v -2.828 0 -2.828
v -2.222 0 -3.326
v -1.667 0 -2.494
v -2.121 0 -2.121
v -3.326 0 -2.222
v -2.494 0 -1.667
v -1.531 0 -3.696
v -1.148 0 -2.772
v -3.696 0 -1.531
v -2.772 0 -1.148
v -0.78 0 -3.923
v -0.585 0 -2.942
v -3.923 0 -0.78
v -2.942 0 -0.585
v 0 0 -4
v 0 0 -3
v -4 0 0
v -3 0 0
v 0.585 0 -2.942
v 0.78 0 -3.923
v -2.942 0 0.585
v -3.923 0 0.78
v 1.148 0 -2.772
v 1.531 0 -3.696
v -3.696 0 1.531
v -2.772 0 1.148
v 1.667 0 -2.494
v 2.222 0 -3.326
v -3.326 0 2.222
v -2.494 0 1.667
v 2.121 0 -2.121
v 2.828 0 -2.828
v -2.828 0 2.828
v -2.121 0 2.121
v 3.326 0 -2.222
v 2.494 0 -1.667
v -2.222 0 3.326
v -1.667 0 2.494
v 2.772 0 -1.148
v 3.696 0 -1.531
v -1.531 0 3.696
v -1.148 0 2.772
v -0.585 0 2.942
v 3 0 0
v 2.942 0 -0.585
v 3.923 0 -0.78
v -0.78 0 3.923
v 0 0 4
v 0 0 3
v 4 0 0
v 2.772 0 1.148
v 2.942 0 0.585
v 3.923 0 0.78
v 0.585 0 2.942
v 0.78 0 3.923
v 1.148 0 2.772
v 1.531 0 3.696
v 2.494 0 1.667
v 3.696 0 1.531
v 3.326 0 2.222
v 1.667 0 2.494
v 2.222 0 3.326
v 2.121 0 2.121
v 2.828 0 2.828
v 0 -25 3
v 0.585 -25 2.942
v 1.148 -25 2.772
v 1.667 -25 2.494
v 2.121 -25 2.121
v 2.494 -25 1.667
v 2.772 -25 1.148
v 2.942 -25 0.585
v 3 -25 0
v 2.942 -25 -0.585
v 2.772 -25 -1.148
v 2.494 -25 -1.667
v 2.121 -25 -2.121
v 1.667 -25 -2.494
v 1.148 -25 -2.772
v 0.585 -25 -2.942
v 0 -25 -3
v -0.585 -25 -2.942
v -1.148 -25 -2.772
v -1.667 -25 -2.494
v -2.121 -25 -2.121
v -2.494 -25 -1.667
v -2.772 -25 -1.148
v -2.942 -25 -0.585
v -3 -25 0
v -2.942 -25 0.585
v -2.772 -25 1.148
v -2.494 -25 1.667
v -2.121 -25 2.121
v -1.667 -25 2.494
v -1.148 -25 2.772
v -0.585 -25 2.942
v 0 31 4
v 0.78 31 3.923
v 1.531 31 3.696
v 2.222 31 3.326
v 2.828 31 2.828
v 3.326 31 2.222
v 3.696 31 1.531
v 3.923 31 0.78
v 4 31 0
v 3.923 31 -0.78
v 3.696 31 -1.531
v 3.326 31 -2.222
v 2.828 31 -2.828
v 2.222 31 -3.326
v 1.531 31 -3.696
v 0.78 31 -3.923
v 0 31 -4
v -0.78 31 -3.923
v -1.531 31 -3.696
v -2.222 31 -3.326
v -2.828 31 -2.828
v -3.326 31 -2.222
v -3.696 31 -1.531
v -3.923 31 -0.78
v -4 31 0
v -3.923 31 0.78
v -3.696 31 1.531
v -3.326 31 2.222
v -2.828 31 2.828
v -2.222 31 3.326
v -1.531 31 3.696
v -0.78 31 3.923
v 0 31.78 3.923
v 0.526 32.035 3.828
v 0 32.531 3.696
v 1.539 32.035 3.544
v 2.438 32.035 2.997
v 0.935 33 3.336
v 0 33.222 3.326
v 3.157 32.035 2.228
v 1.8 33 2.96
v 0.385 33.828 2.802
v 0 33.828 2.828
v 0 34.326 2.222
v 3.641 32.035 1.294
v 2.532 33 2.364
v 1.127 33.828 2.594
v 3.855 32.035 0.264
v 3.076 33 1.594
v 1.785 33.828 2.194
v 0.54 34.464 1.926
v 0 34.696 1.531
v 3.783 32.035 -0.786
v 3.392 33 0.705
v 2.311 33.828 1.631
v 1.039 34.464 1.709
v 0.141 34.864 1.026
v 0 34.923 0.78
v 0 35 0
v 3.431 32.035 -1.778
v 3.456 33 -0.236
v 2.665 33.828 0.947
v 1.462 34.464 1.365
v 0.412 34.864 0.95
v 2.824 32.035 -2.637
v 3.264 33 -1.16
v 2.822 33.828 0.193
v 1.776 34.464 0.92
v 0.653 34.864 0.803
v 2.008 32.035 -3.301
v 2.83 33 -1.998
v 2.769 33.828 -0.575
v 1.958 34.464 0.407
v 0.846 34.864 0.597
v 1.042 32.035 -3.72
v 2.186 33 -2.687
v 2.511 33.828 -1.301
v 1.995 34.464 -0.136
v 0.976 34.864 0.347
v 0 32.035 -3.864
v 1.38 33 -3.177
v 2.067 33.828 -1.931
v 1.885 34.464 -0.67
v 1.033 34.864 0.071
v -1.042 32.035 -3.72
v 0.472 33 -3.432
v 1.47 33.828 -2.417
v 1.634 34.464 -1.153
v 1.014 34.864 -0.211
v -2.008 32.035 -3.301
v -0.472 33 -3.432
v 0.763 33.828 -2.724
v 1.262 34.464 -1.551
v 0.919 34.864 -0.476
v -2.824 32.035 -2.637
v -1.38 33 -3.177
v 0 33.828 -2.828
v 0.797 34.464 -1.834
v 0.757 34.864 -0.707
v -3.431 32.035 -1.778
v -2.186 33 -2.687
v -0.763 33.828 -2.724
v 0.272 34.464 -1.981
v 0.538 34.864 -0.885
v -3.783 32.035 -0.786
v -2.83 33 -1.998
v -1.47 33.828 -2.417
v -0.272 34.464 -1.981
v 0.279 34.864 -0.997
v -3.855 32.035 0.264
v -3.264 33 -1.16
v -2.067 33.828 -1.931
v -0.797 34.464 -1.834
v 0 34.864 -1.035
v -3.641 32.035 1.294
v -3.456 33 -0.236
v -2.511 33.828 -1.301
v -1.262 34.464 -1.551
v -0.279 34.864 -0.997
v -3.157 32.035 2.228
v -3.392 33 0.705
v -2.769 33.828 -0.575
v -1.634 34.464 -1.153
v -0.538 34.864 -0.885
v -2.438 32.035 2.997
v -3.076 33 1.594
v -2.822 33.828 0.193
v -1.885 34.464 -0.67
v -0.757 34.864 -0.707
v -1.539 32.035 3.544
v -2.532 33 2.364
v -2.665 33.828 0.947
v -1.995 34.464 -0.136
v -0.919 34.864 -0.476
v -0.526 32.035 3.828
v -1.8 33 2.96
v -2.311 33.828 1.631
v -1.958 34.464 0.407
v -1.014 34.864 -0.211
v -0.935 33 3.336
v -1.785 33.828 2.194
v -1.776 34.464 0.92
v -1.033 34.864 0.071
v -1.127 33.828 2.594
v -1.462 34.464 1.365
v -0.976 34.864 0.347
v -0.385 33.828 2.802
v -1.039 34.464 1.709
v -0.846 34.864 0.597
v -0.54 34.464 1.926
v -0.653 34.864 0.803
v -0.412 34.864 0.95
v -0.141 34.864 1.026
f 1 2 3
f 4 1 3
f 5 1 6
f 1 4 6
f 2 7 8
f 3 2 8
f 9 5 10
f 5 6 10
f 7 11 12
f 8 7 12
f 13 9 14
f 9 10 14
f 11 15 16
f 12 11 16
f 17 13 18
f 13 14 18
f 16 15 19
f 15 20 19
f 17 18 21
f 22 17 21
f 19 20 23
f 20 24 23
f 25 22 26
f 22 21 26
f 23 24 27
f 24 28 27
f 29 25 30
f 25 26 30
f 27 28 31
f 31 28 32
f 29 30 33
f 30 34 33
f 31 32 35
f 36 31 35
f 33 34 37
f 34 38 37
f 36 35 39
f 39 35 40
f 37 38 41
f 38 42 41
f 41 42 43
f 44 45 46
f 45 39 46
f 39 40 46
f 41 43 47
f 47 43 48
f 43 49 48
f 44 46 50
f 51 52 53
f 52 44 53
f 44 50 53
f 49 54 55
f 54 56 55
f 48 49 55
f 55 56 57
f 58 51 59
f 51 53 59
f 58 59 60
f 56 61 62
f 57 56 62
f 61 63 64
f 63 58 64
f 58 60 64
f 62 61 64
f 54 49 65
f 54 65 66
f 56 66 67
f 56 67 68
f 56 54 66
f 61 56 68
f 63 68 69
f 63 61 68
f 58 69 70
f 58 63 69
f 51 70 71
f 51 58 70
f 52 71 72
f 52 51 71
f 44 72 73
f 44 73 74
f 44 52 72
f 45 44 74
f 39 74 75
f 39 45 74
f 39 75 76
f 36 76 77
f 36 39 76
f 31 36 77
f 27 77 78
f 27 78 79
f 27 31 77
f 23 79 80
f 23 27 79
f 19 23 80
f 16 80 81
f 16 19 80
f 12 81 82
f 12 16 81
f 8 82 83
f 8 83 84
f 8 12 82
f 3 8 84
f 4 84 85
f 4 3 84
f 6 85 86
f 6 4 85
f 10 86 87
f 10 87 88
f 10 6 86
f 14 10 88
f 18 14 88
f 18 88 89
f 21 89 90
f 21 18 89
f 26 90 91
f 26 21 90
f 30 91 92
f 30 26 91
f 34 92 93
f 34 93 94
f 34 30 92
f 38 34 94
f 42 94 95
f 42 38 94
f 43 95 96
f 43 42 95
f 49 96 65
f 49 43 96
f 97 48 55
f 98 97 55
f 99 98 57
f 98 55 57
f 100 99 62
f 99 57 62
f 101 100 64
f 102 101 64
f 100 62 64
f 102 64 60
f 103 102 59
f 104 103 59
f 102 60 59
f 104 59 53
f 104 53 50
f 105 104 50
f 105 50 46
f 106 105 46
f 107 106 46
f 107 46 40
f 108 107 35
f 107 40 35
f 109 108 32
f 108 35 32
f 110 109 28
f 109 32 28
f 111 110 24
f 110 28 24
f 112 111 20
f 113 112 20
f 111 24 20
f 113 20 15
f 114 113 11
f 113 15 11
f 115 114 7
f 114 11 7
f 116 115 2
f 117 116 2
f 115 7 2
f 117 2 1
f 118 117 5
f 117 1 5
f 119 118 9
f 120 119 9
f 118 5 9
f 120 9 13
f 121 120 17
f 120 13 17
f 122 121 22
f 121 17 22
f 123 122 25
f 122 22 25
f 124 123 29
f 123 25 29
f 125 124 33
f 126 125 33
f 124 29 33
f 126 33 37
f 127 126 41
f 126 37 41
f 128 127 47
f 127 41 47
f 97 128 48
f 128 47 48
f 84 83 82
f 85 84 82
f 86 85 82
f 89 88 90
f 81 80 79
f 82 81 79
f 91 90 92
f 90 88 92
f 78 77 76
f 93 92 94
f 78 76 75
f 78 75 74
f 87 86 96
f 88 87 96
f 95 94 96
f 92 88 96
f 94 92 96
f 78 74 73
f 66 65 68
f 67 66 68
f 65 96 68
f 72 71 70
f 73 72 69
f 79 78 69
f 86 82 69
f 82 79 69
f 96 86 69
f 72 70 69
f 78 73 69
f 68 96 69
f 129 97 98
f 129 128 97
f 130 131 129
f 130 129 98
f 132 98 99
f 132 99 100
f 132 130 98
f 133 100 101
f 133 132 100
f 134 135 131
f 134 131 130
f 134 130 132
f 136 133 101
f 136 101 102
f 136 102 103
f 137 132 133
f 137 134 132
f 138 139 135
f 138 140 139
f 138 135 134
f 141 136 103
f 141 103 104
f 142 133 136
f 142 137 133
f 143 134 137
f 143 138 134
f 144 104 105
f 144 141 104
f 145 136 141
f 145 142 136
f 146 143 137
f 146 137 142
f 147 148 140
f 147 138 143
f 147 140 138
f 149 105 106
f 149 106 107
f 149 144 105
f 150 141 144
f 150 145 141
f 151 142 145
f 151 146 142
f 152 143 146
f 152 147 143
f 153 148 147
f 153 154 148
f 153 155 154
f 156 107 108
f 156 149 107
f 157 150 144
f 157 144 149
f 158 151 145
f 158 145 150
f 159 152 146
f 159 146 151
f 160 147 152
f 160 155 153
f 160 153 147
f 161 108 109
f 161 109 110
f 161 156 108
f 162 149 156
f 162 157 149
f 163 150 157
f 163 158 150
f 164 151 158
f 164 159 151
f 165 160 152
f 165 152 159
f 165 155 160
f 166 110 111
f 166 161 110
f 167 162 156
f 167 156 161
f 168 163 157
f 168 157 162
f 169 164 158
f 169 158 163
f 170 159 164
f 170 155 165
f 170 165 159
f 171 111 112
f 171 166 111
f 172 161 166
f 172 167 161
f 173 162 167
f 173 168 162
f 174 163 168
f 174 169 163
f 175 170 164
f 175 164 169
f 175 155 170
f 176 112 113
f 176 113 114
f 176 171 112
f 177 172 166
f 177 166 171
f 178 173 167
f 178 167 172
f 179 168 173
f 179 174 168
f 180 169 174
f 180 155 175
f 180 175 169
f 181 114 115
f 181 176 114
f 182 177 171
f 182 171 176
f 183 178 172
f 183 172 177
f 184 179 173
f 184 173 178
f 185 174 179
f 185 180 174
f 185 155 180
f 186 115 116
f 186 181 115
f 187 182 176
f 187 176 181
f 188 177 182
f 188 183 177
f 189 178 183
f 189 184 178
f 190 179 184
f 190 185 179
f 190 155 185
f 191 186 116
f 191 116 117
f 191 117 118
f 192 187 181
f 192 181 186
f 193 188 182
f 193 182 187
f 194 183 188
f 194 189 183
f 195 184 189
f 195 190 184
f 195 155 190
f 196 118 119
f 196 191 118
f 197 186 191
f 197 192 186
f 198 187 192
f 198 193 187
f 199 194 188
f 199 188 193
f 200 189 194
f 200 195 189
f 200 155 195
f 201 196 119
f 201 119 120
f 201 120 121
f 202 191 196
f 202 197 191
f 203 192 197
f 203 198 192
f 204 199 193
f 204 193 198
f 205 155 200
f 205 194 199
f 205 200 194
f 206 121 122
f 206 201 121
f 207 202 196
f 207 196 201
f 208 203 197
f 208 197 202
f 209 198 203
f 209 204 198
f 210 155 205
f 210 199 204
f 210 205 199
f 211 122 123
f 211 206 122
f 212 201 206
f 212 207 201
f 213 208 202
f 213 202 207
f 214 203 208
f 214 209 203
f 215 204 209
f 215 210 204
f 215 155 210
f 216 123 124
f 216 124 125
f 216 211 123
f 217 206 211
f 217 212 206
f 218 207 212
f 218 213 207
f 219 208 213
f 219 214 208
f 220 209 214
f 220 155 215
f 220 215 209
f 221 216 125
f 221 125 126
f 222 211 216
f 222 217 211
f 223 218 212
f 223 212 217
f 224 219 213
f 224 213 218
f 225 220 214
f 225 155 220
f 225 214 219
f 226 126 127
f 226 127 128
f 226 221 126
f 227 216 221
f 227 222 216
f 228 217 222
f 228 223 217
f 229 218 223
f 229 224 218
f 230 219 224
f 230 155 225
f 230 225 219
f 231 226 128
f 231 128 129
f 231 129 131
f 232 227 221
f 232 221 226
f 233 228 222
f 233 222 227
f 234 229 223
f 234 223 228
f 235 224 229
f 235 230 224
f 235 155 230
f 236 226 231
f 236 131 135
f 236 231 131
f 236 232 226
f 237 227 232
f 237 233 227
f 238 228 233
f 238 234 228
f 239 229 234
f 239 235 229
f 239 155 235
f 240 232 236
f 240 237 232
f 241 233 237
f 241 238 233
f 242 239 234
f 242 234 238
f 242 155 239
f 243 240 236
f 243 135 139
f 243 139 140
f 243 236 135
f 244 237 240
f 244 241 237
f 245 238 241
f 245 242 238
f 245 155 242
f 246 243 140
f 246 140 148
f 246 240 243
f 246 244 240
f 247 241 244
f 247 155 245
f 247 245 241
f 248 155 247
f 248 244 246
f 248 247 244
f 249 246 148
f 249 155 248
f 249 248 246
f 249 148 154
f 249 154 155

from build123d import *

# Parameters (mm, degrees)
SKETCH1_R           = 4
BOSS_EXTRUDE1_DEPTH = 35
SKETCH1_3_R         = 3
BOSS_EXTRUDE2_DEPTH = 25
FILLET1_R           = 4


with BuildPart() as part:
    # Sketch1 → Boss-Extrude1 (new body)
    with BuildSketch(Plane(origin=(0, 0, 0), x_dir=(1, 0, 0), z_dir=(0, 1, 0))):
        Circle(SKETCH1_R)
    extrude(amount=BOSS_EXTRUDE1_DEPTH)

    # Sketch1<3> → Boss-Extrude2 (add)
    with BuildSketch(Plane(origin=(0, 0, 0), x_dir=(1, 0, 0), z_dir=(0, 1, 0))):
        Circle(SKETCH1_3_R)
    extrude(amount=-BOSS_EXTRUDE2_DEPTH)

    # Fillet1
    fillet1_edges = [part.edges().sort_by_distance(p)[0] for p in [
        (-4, 35, 0),
    ]]
    fillet(fillet1_edges, radius=FILLET1_R)


solid = part.part
